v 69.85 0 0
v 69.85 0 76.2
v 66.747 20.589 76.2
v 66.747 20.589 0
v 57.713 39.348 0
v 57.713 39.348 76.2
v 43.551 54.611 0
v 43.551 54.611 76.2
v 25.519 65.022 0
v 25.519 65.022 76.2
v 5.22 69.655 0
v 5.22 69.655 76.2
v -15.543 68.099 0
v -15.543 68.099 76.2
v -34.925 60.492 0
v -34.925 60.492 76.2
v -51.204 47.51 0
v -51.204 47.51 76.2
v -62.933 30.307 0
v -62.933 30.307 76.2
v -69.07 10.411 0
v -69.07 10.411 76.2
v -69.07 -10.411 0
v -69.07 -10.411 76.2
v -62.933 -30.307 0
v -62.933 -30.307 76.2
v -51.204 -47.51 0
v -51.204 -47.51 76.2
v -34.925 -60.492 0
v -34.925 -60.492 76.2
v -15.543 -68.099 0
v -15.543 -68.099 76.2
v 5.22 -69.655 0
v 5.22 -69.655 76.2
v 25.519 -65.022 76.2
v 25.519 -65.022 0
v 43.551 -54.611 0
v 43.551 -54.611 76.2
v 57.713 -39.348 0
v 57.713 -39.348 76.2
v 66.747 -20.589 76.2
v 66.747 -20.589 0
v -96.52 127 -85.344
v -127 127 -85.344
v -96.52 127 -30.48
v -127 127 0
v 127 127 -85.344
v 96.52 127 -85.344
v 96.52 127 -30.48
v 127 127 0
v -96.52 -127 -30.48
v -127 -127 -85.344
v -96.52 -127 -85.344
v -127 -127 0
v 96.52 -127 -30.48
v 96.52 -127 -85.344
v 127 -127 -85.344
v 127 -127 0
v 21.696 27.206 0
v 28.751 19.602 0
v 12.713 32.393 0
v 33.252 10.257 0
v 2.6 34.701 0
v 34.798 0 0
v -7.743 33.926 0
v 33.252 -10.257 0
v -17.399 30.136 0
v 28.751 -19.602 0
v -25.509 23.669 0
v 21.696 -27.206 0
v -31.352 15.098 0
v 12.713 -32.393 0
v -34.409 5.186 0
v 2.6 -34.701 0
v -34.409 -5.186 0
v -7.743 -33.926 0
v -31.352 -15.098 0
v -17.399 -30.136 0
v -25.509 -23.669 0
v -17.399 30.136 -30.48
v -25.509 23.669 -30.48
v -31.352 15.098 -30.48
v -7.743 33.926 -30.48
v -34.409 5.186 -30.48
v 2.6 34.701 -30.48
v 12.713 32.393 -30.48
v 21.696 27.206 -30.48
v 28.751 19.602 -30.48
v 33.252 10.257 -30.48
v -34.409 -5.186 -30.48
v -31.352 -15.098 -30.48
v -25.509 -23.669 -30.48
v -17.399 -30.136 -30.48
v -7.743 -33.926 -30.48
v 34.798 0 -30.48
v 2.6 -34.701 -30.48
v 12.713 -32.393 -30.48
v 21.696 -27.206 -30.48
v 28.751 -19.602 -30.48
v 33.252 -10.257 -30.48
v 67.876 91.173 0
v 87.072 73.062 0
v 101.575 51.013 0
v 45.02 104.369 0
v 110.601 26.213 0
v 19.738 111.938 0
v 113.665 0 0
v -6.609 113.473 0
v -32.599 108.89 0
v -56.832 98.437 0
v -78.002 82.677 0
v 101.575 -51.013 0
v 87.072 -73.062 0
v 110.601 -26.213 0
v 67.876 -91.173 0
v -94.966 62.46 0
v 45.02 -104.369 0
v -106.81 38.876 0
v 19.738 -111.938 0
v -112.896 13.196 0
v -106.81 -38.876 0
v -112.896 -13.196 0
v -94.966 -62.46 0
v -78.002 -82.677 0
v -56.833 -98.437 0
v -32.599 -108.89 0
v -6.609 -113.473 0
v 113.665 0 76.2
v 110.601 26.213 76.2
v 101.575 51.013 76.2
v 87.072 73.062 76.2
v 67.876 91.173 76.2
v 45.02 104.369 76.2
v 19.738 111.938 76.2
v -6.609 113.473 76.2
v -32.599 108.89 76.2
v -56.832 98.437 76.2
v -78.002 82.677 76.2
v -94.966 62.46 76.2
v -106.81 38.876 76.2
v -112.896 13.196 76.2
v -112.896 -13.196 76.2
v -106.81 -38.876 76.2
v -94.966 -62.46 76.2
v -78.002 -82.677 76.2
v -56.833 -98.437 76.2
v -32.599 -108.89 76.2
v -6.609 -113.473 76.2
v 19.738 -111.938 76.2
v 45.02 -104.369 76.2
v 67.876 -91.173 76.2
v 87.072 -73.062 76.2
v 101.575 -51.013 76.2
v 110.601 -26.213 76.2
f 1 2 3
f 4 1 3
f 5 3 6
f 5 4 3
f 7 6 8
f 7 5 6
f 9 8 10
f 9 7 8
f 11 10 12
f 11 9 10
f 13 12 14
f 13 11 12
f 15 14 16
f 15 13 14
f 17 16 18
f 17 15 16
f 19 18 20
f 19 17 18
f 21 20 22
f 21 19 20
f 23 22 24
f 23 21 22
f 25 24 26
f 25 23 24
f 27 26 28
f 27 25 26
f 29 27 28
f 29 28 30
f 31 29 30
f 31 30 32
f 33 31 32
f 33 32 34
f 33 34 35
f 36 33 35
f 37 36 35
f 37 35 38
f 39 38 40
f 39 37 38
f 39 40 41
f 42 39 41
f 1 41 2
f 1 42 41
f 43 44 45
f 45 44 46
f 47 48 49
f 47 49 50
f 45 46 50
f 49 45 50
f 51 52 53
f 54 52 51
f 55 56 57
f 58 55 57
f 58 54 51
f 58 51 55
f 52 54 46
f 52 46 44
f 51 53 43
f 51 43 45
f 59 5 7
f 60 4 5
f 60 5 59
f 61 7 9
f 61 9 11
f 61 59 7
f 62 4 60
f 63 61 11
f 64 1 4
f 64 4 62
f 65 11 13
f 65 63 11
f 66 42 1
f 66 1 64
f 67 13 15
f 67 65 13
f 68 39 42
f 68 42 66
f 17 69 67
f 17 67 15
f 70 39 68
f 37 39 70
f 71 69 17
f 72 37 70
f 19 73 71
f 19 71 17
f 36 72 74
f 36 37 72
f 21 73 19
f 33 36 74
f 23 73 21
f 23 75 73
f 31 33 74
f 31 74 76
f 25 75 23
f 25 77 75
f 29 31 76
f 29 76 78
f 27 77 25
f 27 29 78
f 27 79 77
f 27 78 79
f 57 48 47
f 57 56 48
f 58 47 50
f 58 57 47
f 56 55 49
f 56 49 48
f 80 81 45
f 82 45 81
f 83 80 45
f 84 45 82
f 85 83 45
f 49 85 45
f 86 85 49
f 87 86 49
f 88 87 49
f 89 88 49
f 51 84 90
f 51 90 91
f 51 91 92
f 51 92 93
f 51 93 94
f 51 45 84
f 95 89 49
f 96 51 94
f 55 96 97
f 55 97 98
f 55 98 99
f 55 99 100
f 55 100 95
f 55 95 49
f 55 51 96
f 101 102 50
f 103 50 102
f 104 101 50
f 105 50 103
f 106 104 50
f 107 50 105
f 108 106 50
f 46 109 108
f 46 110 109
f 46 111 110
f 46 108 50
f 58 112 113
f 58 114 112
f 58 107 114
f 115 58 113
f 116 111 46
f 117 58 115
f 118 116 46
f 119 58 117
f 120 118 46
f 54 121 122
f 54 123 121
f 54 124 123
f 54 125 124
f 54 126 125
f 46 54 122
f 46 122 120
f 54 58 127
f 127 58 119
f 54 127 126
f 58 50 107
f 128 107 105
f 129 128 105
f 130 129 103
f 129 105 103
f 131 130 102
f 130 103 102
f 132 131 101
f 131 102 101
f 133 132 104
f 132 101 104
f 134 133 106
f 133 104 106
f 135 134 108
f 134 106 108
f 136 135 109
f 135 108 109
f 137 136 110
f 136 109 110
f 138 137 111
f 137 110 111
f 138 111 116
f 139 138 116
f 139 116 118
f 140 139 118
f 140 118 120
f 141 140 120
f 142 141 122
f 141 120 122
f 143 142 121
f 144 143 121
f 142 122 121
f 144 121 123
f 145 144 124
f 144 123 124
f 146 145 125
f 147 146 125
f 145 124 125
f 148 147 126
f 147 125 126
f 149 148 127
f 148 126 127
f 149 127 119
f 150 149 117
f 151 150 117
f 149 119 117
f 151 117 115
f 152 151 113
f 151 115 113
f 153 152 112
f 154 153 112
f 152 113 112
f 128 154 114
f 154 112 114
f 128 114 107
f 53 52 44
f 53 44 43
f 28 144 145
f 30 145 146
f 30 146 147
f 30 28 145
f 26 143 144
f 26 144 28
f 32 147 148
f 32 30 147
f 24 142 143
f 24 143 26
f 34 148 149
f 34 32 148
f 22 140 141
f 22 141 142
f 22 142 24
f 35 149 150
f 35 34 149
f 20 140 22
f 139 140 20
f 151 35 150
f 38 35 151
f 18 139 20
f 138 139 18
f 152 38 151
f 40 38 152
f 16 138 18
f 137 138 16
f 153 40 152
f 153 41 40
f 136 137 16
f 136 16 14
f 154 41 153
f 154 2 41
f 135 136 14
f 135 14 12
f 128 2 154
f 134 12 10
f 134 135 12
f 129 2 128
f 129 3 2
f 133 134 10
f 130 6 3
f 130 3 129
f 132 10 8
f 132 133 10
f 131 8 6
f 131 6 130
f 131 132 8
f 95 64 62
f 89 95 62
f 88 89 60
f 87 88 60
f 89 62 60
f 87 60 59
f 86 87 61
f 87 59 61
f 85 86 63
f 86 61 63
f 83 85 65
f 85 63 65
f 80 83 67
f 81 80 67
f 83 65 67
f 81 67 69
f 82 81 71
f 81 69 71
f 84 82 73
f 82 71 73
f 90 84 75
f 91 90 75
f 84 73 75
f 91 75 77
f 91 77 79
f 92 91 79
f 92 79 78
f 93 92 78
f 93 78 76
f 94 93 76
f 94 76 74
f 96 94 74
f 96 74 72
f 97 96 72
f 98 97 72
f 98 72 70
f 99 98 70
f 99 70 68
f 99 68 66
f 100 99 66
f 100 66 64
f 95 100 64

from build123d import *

# Parameters (mm, degrees)
F1_DEPTH = 127
F2_R     = 113.665
F2_R_2   = 69.85
F3_DEPTH = 76.2
F2_R_3   = 34.798
F4_DEPTH = 101.6


with BuildPart() as f1:
    # F0 (on Front) → F1 (new body, symmetric)
    with BuildSketch(Plane.XZ):
        Polygon((127, 0), (0, 0), (0, -30.48), (96.52, -30.48), (96.52, -85.344), (127, -85.344), align=None)
        Polygon((0, -30.48), (0, 0), (-127, 0), (-127, -85.344), (-96.52, -85.344), (-96.52, -30.48), align=None)
    extrude(amount=F1_DEPTH, both=True)

    # F2 (on face) → F3 (join)
    with BuildSketch(Plane.XY):
        Circle(F2_R)
        Circle(F2_R_2, mode=Mode.SUBTRACT)
    extrude(amount=F3_DEPTH)

    # F2 (on face) → F4 (cut)
    with BuildSketch(Plane.XY):
        Circle(F2_R_3)
    extrude(amount=-F4_DEPTH, mode=Mode.SUBTRACT)


solid = f1.part
